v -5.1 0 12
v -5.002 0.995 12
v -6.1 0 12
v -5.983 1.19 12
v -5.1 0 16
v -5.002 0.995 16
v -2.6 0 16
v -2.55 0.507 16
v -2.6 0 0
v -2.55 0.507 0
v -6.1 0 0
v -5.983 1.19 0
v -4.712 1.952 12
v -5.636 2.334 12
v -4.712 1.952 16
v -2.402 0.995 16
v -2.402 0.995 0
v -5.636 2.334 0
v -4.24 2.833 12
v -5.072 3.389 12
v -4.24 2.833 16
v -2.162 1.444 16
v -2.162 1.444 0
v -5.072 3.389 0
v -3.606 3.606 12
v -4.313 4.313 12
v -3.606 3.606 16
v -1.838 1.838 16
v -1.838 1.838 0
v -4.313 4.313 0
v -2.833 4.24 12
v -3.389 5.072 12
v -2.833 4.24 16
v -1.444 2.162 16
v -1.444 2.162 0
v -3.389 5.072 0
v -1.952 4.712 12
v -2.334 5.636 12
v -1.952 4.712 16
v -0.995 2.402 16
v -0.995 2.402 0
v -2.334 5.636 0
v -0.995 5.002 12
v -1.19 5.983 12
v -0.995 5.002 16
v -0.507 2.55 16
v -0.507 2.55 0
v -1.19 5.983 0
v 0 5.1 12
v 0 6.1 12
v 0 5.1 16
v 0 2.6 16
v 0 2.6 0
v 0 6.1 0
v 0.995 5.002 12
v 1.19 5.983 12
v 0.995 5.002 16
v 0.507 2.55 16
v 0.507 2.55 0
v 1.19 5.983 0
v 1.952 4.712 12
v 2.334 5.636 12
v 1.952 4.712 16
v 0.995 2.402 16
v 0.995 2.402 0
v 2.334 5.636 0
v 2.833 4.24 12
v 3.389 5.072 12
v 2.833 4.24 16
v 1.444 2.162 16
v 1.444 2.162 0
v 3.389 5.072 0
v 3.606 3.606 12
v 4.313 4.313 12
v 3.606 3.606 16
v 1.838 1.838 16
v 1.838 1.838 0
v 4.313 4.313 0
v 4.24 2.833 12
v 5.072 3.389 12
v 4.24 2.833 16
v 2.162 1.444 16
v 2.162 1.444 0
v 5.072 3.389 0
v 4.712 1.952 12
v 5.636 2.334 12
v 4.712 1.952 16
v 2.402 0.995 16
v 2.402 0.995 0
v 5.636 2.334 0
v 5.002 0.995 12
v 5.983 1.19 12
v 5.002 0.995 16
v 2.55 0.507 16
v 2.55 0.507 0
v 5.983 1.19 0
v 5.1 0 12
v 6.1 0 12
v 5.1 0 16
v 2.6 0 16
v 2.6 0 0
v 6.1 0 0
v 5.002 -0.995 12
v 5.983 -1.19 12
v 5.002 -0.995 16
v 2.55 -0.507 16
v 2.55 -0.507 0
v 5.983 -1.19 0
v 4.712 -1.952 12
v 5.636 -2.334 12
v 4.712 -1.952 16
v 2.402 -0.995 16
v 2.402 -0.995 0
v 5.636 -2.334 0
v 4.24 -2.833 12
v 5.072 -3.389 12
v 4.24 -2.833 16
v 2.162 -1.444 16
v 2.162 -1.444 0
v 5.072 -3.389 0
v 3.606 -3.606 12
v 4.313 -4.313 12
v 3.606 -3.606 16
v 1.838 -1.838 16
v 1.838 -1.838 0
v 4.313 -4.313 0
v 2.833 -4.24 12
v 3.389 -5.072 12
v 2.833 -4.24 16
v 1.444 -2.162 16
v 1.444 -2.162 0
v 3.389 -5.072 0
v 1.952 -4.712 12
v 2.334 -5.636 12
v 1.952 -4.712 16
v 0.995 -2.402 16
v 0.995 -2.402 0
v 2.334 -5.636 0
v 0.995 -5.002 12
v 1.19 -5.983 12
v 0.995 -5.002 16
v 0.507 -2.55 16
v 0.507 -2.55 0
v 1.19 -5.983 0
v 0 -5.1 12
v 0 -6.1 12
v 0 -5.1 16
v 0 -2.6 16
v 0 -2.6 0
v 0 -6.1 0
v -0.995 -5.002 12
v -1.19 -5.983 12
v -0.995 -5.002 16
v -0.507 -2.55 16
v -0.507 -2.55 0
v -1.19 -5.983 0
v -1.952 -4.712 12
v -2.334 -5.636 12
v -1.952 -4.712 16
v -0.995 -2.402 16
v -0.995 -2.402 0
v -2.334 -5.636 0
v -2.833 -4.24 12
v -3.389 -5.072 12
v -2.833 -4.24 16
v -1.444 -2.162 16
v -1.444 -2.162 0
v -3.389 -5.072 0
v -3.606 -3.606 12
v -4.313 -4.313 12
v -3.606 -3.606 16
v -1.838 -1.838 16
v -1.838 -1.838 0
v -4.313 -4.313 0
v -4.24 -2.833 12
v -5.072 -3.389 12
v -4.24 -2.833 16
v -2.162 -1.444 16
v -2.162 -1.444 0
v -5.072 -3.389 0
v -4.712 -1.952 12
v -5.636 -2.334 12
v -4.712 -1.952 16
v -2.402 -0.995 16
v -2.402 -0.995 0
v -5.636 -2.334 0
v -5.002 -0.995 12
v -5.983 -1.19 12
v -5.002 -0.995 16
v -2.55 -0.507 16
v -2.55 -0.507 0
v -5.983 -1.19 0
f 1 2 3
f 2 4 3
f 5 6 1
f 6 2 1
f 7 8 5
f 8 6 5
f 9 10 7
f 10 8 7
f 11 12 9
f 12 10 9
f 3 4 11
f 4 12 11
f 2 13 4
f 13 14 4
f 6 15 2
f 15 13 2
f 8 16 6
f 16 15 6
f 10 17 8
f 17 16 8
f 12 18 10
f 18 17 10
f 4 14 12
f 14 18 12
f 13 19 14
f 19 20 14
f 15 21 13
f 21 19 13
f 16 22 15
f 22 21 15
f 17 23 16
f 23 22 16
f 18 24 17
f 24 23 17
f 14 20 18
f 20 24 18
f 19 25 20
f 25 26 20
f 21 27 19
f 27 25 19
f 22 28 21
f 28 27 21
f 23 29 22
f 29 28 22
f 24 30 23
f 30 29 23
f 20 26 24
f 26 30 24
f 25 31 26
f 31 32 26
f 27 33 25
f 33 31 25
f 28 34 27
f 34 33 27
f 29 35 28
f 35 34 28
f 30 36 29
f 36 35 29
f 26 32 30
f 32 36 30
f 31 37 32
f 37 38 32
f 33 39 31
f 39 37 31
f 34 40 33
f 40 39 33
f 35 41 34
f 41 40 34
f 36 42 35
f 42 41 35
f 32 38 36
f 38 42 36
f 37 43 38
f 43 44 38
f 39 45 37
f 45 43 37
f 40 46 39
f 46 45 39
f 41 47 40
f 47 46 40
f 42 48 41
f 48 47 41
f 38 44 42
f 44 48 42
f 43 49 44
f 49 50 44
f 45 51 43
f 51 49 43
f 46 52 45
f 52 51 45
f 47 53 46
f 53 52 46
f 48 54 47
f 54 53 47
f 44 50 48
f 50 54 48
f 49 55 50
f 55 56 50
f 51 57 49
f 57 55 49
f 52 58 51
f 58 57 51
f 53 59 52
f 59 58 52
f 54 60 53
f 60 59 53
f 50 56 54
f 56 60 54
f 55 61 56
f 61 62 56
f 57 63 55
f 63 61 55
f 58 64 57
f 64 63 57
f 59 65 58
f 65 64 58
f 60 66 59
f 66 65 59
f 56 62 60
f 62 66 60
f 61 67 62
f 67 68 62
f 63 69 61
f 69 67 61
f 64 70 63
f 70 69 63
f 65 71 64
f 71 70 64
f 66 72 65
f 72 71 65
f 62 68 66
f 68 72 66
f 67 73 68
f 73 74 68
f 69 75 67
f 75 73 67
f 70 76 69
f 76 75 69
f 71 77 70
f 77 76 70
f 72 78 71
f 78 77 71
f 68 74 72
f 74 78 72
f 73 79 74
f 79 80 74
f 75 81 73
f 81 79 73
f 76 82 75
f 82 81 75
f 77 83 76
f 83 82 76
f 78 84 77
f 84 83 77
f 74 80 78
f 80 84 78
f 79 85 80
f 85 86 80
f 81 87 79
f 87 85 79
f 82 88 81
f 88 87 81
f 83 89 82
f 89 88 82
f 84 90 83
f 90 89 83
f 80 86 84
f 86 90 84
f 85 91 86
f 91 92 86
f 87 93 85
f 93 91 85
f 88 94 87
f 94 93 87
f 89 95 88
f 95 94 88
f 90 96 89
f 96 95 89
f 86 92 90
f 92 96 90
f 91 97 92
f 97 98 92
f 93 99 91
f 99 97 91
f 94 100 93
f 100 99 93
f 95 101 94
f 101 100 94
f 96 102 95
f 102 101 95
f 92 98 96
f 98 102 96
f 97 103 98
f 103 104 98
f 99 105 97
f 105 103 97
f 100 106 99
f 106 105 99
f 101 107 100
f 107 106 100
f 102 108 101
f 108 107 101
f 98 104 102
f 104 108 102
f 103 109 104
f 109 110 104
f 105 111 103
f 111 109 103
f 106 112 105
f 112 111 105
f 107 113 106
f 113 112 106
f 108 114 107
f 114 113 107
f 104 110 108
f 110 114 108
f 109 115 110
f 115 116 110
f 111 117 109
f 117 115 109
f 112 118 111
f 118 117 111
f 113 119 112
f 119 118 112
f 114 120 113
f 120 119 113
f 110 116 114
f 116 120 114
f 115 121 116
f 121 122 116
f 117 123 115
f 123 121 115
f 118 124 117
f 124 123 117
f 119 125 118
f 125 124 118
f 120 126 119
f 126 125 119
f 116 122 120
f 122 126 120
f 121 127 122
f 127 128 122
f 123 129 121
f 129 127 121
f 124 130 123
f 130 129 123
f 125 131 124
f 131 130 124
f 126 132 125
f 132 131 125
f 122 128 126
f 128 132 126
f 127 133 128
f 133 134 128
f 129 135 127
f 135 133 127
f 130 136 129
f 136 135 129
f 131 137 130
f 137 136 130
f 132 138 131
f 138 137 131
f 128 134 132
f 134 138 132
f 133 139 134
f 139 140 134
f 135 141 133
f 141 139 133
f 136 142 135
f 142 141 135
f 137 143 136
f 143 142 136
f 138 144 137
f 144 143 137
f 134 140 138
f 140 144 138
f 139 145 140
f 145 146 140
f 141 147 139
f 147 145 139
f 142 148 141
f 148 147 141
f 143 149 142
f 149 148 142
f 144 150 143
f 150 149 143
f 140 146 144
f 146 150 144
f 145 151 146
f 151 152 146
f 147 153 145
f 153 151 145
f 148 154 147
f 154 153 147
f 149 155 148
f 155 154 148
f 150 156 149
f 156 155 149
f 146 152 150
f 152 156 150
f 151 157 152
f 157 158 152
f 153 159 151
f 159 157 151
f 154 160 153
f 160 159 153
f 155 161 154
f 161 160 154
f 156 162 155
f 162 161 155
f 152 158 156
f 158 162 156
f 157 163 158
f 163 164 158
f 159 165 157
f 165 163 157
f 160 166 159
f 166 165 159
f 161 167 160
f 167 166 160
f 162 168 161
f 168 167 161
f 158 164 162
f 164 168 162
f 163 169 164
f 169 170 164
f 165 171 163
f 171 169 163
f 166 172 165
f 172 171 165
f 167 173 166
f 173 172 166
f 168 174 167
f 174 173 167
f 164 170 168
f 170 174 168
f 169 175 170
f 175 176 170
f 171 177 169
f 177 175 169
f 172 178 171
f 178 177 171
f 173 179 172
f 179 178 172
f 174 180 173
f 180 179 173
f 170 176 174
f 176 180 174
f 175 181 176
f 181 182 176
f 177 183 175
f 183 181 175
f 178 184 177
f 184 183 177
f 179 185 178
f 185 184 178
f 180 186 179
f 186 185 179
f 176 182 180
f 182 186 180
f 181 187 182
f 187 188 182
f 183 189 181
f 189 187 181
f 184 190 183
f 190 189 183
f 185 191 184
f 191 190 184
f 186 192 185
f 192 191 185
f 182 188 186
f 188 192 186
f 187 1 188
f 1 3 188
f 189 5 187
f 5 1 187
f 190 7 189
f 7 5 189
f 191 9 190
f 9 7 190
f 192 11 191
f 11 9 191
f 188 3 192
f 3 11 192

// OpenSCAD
$fn = 32;

// ----------------------------------------------------------------------
// Form washer: stepped_c washer, 12.2 mm outside, 5.2 mm bore
// ----------------------------------------------------------------------

// --- parameters (mm) ---
revolve_angle = 360;      // full turn around the Z axis
profile_points = 6;       // points of the closed outline

profile = [[2.6, 0], [6.1, 0], [6.1, 12], [5.1, 12], [5.1, 16], [2.6, 16]];  // single closed polygon, 6 points, counter clockwise

// --- the one profile operation ---
rotate_extrude(angle = revolve_angle) polygon(points = profile);
